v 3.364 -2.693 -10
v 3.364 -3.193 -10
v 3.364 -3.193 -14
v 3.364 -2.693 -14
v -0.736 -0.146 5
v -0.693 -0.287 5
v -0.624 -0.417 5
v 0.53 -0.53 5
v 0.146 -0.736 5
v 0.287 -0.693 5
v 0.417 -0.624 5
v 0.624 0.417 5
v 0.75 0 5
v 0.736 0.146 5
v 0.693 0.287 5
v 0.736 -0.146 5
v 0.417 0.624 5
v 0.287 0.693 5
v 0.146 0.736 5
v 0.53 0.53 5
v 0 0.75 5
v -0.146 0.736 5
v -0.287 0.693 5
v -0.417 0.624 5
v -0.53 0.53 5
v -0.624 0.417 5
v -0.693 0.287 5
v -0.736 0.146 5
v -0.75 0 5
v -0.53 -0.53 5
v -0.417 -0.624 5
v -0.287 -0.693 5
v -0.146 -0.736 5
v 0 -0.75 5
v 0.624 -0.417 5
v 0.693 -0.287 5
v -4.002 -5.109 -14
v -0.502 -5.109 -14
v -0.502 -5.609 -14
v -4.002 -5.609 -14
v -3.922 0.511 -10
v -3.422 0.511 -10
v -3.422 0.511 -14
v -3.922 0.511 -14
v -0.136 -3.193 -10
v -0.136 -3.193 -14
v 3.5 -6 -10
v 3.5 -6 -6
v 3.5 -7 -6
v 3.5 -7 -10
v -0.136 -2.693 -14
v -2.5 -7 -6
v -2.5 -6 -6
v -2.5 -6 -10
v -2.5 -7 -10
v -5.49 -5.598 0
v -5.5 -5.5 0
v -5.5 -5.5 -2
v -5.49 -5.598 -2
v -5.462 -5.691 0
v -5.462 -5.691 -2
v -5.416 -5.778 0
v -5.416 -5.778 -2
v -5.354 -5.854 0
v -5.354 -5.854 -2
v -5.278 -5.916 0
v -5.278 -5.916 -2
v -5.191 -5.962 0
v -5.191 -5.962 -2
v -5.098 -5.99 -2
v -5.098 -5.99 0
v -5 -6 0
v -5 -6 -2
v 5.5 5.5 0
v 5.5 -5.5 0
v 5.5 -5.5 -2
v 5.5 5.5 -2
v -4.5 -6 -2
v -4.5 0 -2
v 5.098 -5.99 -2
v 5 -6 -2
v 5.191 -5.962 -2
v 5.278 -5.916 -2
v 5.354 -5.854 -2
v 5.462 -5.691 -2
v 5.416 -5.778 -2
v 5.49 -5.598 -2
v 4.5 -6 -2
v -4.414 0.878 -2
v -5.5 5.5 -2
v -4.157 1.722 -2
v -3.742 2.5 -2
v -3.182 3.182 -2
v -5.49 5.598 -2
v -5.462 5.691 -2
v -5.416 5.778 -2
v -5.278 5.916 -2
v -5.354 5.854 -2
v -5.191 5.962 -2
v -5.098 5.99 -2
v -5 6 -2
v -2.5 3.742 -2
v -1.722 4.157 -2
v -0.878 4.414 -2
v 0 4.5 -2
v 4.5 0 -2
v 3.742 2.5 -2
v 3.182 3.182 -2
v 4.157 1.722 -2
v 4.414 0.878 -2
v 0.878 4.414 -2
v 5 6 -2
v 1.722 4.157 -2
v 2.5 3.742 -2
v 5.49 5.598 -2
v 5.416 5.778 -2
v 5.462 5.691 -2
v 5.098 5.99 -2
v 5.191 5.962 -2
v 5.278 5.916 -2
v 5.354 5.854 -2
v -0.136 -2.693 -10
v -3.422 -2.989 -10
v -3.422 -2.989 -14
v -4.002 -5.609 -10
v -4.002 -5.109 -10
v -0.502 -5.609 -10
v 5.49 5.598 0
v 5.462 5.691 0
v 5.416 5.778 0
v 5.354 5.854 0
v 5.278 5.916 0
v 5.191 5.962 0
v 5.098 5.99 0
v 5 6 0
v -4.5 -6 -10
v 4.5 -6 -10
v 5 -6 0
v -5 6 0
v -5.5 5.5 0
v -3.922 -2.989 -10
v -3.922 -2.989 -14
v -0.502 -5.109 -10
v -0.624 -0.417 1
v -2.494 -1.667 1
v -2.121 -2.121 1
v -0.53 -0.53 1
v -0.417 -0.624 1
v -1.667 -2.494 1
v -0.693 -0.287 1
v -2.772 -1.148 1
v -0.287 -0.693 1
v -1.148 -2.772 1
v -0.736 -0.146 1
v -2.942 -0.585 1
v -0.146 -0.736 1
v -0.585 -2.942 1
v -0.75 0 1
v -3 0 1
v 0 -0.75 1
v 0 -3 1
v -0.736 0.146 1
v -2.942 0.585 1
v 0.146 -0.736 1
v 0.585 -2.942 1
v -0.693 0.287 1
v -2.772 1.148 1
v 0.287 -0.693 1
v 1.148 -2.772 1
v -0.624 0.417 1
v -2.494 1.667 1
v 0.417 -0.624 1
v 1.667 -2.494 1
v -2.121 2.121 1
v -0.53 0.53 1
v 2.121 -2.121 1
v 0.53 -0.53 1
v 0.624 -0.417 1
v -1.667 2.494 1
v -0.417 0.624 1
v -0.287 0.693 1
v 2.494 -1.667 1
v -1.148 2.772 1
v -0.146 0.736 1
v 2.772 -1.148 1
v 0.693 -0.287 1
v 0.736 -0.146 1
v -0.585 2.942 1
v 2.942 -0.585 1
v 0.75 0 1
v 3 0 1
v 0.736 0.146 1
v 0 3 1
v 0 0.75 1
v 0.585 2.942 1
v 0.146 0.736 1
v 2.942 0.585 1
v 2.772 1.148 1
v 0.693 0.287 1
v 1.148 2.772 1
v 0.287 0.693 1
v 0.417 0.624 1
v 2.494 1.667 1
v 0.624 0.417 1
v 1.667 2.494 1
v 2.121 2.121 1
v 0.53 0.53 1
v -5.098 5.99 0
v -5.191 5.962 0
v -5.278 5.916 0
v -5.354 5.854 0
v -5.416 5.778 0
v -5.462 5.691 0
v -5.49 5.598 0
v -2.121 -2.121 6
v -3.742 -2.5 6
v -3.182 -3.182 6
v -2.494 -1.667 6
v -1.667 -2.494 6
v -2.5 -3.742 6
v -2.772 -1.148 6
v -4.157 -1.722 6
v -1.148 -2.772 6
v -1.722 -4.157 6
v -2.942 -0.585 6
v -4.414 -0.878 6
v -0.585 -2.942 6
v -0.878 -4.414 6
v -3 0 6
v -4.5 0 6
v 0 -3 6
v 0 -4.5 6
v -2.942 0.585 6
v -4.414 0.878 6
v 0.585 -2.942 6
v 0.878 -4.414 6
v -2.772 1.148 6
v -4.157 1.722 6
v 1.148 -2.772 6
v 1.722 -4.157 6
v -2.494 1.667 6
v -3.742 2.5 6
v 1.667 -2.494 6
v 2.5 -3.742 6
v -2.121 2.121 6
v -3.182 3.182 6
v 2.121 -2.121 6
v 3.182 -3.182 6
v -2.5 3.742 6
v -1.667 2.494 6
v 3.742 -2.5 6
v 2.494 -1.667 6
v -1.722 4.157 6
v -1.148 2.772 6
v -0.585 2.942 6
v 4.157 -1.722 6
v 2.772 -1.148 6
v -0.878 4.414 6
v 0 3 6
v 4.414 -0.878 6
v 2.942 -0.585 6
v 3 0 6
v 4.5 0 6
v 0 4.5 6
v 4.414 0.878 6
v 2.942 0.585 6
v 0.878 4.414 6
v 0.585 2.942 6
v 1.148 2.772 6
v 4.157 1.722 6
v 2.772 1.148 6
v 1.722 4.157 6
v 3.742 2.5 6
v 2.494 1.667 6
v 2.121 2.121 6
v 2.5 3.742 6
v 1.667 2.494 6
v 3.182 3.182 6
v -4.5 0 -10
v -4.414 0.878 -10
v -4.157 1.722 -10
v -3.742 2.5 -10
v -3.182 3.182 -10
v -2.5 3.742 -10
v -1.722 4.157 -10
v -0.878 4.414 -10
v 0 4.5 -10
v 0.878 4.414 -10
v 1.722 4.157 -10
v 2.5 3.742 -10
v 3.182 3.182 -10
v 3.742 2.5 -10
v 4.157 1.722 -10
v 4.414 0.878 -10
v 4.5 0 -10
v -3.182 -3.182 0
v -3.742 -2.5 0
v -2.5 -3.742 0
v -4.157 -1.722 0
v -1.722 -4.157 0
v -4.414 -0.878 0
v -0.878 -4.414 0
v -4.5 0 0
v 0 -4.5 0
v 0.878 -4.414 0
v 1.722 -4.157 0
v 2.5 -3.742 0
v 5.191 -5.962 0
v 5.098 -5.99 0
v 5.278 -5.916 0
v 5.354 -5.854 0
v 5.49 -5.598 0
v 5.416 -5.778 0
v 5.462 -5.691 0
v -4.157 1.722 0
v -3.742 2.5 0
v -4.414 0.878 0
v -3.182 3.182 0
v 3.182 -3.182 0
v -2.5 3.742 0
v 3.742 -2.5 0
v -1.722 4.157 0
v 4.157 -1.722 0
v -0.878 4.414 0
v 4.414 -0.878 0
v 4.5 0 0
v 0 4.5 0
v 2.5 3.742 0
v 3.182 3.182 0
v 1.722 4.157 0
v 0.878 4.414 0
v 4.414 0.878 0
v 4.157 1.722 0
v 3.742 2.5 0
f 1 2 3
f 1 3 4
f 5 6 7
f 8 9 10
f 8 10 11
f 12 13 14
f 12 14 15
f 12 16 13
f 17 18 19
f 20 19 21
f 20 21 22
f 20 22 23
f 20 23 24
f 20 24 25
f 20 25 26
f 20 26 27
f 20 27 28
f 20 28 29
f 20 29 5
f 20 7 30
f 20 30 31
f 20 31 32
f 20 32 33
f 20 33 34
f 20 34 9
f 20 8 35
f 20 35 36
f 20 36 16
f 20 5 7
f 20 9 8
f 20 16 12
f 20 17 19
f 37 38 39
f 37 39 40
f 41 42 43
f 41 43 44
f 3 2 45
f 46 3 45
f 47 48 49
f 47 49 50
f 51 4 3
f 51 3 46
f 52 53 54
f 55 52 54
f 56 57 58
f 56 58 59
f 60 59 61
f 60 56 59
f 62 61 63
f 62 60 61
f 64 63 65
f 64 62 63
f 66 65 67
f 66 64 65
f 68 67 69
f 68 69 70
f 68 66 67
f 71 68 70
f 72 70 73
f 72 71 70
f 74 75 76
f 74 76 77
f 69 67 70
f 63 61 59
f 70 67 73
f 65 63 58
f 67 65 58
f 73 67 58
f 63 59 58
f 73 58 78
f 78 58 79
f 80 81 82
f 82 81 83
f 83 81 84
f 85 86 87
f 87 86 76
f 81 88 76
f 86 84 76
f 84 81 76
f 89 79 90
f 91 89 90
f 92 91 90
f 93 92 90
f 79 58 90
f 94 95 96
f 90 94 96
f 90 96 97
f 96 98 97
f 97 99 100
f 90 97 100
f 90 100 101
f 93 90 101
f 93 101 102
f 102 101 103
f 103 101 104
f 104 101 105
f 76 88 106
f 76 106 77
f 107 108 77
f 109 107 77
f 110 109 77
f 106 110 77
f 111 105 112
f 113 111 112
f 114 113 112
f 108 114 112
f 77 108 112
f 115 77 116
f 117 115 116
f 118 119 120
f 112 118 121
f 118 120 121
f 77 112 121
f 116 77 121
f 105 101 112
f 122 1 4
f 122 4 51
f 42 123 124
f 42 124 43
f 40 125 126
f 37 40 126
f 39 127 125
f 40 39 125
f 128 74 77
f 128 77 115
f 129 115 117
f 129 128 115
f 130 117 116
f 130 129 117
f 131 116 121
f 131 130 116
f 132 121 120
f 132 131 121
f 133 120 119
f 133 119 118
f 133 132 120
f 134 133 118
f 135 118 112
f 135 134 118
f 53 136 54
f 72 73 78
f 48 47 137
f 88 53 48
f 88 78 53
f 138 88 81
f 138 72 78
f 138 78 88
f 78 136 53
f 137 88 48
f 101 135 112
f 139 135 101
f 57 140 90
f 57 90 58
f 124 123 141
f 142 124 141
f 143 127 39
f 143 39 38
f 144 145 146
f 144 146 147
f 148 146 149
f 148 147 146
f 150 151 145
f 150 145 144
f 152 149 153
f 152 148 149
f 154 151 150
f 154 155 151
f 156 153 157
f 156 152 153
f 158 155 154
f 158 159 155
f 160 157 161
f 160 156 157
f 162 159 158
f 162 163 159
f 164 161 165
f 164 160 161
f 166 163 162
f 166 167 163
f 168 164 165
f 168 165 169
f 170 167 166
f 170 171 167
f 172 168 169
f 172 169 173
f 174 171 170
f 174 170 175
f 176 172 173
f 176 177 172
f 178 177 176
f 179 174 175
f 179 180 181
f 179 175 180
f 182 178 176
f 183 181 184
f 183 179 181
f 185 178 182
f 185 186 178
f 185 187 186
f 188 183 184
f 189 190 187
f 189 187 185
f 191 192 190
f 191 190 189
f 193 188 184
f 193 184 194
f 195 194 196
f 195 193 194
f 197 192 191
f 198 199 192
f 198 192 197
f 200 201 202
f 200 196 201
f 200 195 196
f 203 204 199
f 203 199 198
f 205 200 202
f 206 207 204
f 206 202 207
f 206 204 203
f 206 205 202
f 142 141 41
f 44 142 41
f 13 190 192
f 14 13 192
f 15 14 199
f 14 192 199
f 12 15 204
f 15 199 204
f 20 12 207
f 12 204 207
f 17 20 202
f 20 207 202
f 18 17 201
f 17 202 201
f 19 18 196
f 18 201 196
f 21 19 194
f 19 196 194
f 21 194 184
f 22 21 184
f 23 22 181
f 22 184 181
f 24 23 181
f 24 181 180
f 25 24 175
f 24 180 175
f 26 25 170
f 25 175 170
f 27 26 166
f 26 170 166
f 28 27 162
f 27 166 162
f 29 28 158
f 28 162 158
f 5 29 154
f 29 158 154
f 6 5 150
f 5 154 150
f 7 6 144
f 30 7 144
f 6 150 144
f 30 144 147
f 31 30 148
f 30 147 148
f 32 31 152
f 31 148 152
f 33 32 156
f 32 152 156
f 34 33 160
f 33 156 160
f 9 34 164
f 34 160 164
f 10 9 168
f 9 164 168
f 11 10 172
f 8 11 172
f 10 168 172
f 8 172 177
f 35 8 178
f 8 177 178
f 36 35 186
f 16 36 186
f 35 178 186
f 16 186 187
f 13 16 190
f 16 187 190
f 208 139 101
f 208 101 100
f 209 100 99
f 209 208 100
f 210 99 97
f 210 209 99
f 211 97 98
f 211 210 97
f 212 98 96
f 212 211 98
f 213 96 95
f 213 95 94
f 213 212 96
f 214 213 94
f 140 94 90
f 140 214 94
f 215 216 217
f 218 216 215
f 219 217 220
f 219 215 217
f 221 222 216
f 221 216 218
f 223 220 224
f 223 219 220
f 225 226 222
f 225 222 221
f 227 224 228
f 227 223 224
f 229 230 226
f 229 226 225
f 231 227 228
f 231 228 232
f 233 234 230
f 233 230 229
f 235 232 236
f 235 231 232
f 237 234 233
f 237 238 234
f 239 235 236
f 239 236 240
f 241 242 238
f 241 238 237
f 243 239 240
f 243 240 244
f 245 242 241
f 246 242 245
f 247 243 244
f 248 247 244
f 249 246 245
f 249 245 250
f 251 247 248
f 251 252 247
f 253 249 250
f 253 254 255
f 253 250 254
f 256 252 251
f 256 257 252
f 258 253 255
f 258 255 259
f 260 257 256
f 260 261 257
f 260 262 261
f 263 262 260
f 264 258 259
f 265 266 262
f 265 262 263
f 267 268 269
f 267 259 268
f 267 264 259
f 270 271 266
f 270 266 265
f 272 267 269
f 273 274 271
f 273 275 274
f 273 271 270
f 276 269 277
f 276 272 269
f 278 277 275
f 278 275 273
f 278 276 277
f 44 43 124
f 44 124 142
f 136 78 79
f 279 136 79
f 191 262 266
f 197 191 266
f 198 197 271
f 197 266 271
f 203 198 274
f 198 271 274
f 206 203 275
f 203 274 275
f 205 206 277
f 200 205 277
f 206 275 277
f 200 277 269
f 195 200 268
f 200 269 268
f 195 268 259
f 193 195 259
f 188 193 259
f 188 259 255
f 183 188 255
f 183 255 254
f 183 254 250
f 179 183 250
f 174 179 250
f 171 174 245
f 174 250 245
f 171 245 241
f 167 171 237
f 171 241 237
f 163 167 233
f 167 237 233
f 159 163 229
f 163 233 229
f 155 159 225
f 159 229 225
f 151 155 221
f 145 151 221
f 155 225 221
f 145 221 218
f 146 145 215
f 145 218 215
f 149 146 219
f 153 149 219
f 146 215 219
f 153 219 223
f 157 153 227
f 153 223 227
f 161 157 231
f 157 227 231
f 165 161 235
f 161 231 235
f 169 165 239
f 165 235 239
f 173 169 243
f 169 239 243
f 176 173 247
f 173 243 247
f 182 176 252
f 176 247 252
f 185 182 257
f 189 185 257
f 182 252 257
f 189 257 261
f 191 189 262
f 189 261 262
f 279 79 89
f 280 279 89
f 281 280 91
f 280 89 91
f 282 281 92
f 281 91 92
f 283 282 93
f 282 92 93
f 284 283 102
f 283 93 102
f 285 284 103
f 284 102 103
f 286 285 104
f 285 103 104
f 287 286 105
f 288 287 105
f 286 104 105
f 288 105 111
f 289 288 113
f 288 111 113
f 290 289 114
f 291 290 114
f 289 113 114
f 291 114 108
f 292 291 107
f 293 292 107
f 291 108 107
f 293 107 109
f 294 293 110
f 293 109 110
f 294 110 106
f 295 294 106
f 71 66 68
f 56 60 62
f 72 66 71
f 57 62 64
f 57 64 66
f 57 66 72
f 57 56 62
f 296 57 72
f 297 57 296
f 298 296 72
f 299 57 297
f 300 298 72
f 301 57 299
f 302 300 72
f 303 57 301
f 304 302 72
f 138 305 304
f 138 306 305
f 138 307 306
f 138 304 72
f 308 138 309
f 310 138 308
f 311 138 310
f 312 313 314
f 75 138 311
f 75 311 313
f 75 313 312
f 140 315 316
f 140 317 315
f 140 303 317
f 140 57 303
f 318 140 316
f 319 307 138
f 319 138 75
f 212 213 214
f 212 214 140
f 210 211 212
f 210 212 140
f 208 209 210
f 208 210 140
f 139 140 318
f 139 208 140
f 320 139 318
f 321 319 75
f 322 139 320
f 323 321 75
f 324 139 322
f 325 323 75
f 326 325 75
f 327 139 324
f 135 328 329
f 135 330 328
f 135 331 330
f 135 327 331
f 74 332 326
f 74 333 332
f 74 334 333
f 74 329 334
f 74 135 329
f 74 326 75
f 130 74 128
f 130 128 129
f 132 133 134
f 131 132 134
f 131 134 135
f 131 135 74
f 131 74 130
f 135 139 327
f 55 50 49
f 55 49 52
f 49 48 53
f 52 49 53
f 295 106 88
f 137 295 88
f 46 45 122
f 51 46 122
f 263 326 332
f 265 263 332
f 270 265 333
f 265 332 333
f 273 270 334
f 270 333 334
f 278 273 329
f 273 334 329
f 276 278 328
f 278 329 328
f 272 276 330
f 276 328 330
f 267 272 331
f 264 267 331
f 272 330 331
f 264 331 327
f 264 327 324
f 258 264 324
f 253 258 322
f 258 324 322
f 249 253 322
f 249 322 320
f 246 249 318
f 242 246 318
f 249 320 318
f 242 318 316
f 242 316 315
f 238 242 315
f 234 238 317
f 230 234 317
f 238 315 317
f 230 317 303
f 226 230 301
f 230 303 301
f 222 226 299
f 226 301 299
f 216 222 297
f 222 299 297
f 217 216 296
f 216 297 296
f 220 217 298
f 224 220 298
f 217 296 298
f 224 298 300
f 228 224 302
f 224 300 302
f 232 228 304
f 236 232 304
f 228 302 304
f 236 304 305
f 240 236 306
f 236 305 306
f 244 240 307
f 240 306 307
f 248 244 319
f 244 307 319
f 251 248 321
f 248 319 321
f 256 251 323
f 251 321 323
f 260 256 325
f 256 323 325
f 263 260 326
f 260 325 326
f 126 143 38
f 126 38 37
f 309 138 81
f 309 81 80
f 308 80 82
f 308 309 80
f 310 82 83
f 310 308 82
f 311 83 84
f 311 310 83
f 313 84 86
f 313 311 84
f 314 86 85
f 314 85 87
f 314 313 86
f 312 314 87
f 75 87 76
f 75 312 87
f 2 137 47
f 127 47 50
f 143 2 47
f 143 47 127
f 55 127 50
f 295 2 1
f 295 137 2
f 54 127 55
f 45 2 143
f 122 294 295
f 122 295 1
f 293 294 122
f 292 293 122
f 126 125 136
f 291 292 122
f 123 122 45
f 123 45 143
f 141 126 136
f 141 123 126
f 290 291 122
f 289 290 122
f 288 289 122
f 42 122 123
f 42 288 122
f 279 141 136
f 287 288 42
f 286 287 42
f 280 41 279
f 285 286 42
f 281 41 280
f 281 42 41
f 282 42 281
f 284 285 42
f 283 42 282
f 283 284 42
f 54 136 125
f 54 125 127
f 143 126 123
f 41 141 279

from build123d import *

# Parameters (mm, degrees)
SKETCH1_R           = 4.5
BOSS_EXTRUDE1_DEPTH = 6
SKETCH2_R           = 3
CUT_EXTRUDE1_DEPTH  = 5
SKETCH3_R           = 0.75
BOSS_EXTRUDE2_DEPTH = 4
BOSS_EXTRUDE3_DEPTH = 2
BOSS_EXTRUDE4_DEPTH = 8
SKETCH7_W           = 0.5
SKETCH7_H           = 3.5
SKETCH7_W_2         = 3.5
SKETCH7_H_2         = 0.5
BOSS_EXTRUDE5_DEPTH = 4
SKETCH8_W           = 6
SKETCH8_H           = 4
BOSS_EXTRUDE6_DEPTH = 1


with BuildPart() as part:
    # Sketch1 → Boss-Extrude1 (new body)
    with BuildSketch(Plane.XY):
        Circle(SKETCH1_R)
    extrude(amount=BOSS_EXTRUDE1_DEPTH)

    # Sketch2 → Cut-Extrude1 (cut)
    with BuildSketch(Plane.XY.offset(6)):
        Circle(SKETCH2_R)
    extrude(amount=-CUT_EXTRUDE1_DEPTH, mode=Mode.SUBTRACT)

    # Sketch3 → Boss-Extrude2 (add)
    with BuildSketch(Plane.XY.offset(1)):
        Circle(SKETCH3_R)
    extrude(amount=BOSS_EXTRUDE2_DEPTH)

    # Sketch5 → Boss-Extrude3 (add)
    with BuildSketch(Plane(origin=(0, 0, 0), x_dir=(-1, 0, 0), z_dir=(0, 0, -1))):
        with BuildLine():
            Line((-5, 6), (5, 6))
            ThreePointArc((5, 6), (5.353553391, 5.853553391), (5.5, 5.5))
            Line((5.5, 5.5), (5.5, -5.5))
            ThreePointArc((5.5, -5.5), (5.353553391, -5.853553391), (5, -6))
            Line((5, -6), (-5, -6))
            ThreePointArc((-5, -6), (-5.353553391, -5.853553391), (-5.5, -5.5))
            Line((-5.5, -5.5), (-5.5, 5.5))
            ThreePointArc((-5.5, 5.5), (-5.353553391, 5.853553391), (-5, 6))
        make_face()
    extrude(amount=BOSS_EXTRUDE3_DEPTH)

    # Sketch6 → Boss-Extrude4 (add)
    with BuildSketch(Plane(origin=(0, 0, -2), x_dir=(-1, 0, 0), z_dir=(0, 0, -1))):
        with BuildLine():
            Line((-4.5, 0), (-4.5, -6))
            Line((-4.5, -6), (4.5, -6))
            Line((4.5, -6), (4.5, 0))
            ThreePointArc((4.5, 0), (0, 4.5), (-4.5, 0))
        make_face()
    extrude(amount=BOSS_EXTRUDE4_DEPTH)

    # Sketch7 → Boss-Extrude5 (add)
    with BuildSketch(Plane(origin=(0, 0, -10), x_dir=(-1, 0, 0), z_dir=(0, 0, -1))):
        with Locations((3.672251412, -1.23876186)):
            Rectangle(SKETCH7_W, SKETCH7_H)
        with Locations((2.252036974, -5.358665001)):
            Rectangle(SKETCH7_W_2, SKETCH7_H_2)
        with Locations((-1.614241264, -2.943106028)):
            Rectangle(SKETCH7_W_2, SKETCH7_H_2)
    extrude(amount=BOSS_EXTRUDE5_DEPTH)

    # Sketch8 → Boss-Extrude6 (add)
    with BuildSketch(Plane(origin=(0, -6, 0), x_dir=(-1, 0, 0), z_dir=(0, -1, 0))):
        with Locations((-0.5, 8)):
            Rectangle(SKETCH8_W, SKETCH8_H)
    extrude(amount=BOSS_EXTRUDE6_DEPTH)


solid = part.part
